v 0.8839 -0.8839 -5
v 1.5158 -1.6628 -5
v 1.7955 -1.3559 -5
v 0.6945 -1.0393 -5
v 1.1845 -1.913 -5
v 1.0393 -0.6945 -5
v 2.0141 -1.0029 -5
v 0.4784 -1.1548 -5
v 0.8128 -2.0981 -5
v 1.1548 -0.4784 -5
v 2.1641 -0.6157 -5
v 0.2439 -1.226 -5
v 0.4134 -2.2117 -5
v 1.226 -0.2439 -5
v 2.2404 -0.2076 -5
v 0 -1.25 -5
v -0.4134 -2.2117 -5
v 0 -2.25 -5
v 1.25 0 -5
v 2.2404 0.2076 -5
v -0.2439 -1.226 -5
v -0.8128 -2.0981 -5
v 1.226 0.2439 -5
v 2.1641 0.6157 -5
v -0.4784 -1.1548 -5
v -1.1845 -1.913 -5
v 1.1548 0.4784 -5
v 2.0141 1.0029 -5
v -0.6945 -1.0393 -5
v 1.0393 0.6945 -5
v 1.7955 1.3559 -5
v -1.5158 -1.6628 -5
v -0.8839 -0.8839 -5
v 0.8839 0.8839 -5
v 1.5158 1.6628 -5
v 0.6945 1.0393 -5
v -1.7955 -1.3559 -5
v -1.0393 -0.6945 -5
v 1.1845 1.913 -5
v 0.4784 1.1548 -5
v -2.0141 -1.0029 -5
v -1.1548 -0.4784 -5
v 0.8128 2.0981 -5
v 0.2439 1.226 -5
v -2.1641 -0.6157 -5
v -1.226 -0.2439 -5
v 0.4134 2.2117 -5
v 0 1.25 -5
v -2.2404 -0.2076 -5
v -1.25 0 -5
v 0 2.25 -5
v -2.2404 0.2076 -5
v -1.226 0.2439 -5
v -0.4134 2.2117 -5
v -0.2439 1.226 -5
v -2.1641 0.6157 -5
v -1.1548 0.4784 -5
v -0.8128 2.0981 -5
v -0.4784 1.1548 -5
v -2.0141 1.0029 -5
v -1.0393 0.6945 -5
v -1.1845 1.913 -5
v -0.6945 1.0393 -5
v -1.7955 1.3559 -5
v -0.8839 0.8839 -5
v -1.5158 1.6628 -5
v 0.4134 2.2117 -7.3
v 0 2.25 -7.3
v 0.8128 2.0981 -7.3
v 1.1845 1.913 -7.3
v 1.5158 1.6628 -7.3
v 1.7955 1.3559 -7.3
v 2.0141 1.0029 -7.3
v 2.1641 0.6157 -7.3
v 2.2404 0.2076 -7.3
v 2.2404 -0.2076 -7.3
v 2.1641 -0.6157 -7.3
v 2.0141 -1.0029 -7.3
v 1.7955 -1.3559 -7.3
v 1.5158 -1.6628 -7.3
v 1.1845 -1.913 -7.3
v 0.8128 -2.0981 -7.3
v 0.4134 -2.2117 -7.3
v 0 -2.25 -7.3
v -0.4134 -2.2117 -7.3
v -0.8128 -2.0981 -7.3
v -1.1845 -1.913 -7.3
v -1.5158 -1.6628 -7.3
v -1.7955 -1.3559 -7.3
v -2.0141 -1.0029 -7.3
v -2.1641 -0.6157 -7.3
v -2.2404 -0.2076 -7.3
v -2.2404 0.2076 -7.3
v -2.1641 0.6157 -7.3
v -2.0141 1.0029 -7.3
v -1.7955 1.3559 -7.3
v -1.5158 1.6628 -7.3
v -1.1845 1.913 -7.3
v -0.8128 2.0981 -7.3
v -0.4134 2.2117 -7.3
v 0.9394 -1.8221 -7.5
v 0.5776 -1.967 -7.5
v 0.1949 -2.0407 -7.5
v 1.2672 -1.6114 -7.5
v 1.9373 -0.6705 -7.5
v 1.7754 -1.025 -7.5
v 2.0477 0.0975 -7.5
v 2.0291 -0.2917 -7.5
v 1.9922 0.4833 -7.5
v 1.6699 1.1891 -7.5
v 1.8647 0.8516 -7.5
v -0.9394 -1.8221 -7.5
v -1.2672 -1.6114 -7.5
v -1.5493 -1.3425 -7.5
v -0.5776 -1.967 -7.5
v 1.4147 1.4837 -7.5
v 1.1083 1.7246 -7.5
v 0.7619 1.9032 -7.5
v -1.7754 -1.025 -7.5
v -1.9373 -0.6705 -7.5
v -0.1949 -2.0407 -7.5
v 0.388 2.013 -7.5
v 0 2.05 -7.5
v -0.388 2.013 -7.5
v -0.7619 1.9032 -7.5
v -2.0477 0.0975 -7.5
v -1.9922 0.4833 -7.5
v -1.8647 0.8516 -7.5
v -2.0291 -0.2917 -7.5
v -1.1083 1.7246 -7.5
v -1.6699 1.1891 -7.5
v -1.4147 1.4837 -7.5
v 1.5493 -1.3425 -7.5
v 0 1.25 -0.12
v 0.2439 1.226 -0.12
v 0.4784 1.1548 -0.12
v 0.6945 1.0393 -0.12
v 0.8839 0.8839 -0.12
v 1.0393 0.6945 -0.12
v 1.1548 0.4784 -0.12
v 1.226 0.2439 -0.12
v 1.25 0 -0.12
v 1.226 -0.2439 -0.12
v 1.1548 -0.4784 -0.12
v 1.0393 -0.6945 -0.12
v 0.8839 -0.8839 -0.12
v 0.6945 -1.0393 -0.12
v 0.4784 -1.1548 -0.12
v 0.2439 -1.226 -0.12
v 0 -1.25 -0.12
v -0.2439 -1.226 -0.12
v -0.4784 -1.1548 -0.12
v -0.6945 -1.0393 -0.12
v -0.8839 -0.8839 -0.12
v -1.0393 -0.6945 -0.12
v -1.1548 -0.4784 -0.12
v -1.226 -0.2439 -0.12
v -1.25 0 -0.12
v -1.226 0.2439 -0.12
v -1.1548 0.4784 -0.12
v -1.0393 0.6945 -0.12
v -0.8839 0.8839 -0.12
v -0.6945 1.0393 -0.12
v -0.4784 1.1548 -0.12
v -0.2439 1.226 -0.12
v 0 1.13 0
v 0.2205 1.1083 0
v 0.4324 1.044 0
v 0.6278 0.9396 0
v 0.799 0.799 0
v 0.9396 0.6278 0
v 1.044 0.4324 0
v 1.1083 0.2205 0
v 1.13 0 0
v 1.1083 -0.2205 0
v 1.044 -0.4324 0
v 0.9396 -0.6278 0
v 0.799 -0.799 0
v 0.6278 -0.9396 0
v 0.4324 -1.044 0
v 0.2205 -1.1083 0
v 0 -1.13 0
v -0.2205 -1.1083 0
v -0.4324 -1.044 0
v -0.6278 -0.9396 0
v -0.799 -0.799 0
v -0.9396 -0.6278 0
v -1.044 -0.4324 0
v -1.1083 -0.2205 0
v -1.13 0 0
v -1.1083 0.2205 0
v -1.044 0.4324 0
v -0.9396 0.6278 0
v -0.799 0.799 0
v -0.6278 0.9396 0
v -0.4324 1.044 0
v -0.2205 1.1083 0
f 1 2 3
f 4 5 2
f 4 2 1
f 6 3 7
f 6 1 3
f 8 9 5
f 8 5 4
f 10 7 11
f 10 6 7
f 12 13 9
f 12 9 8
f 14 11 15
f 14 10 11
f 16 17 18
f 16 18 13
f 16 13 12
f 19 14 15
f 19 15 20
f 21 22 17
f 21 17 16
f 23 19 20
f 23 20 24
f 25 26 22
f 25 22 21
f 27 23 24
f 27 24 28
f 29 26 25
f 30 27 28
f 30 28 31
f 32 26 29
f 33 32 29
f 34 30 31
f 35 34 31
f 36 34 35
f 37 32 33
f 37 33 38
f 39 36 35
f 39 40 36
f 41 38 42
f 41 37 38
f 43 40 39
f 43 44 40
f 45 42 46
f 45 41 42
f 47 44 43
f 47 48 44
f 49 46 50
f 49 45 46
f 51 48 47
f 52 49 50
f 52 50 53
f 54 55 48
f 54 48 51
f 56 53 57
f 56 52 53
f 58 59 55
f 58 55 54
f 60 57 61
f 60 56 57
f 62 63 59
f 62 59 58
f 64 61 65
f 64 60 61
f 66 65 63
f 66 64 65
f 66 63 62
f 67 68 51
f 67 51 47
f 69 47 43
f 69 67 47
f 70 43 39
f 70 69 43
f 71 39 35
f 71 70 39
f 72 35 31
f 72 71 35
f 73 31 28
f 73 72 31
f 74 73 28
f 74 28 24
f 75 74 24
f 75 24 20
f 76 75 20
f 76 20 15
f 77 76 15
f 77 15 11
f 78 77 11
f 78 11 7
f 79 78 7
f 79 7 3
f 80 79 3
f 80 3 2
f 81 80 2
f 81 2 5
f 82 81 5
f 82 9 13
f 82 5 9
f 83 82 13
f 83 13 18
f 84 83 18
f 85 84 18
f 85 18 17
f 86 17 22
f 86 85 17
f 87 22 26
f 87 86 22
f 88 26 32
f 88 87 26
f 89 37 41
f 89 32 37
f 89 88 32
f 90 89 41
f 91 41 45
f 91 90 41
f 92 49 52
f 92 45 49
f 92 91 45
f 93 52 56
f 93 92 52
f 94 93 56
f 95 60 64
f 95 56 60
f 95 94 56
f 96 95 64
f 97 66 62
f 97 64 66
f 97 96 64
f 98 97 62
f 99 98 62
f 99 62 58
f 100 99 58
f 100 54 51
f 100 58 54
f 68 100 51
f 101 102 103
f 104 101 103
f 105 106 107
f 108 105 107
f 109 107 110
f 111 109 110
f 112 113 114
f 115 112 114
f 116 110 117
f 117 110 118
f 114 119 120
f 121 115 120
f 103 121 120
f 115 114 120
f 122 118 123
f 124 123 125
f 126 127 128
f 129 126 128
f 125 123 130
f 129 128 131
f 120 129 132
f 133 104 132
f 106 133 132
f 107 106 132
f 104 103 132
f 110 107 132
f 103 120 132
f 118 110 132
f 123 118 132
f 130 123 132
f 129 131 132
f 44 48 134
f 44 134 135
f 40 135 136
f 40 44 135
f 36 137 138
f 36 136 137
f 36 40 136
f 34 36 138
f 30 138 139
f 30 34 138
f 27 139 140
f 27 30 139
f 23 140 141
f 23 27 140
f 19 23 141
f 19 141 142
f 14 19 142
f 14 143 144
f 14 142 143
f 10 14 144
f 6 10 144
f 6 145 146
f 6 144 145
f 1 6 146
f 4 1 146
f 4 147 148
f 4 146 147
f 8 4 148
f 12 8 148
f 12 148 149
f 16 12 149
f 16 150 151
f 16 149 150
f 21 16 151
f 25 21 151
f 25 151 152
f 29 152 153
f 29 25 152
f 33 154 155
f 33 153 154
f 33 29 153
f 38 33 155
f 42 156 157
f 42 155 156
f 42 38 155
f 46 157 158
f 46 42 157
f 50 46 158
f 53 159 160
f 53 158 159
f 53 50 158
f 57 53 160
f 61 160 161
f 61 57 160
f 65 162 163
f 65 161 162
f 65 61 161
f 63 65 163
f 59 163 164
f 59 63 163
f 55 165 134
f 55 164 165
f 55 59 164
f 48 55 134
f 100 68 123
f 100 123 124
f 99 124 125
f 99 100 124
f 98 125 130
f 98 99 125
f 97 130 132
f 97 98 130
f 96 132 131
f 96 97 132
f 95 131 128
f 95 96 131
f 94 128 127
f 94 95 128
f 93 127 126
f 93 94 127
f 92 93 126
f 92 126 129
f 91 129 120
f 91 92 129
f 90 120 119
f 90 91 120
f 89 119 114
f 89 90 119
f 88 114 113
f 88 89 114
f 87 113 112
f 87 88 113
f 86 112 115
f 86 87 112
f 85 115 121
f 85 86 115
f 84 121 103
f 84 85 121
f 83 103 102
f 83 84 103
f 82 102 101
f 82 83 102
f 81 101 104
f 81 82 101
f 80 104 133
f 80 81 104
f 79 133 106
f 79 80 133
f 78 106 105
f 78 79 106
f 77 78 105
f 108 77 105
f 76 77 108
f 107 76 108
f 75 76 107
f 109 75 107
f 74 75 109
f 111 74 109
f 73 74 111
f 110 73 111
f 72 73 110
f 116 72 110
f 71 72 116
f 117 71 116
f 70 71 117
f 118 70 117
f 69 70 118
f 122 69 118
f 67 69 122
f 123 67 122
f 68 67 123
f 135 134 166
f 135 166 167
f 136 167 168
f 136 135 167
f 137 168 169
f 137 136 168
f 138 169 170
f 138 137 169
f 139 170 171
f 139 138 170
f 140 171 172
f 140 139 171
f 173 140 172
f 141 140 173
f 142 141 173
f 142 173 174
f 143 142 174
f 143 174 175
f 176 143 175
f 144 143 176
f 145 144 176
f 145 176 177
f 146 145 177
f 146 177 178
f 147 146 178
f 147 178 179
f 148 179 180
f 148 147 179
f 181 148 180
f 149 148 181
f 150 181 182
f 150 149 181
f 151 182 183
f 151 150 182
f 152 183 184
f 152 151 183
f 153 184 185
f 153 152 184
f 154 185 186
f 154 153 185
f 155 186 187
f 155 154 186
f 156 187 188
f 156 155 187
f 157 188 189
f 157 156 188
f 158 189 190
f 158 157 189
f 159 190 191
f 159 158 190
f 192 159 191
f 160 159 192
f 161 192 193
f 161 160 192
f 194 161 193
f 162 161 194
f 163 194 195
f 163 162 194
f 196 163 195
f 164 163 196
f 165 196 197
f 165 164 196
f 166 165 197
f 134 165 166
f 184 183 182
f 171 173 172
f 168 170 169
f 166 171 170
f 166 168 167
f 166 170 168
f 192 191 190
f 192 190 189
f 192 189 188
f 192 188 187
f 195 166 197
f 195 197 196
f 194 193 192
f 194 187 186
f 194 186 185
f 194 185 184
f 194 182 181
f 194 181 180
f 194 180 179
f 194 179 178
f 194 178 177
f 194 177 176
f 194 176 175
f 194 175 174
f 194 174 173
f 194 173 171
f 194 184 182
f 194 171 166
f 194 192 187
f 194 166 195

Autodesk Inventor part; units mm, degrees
ref_plane "YZ Plane" through (0, 0, 0) normal (1, 0, 0) x (0, 1, 0)
ref_plane "XZ Plane" through (0, 0, 0) normal (0, 1, 0) x (-1, 0, 0)
ref_plane "XY Plane" through (0, 0, 0) normal (0, 0, 1) x (1, 0, 0)
sketch "スケッチ1" plane through (0, 0, 0) normal (1, 0, 0) x (0, 1, 0)
  line L0 (0, 0) -> (1.25, 0)
  line L1 (1.25, 0) -> (1.25, -5)
  line L2 (1.25, -5) -> (0, -5)
  line L3 (0, -5) -> (0, 0)
  line L4 (0, -5) -> (2.25, -5)
  line L5 (2.25, -5) -> (2.25, -7.5)
  line L6 (2.25, -7.5) -> (0, -7.5)
  line L7 (0, -7.5) -> (0, -5)
  line L8 (2.25, -7.3) -> (2.05, -7.5)
  line L9 (1.25, -0.12) -> (1.13, 0)
  point P0 (2.25, -6.25)
  dimension "d0" = 45
  dimension "d1" = 2.25
  dimension "d2" = 2.5
  dimension "d3" = 5
  dimension "d7" = 1.25
  dimension "d10" = 45
  dimension "d11" = 0.2
  dimension "d12" = 0.12
revolve "回転1" add sketch "スケッチ1" angle 360 about axis through (0, 0, -5) along (0, 0, 1) contours L0 L9 L1 L2 L3 | L2 L4 L5 L8 L6 L7
thread "ねじ2" size "M2.5x0.45" class "6g" standard "ANSI Metric M Profile" length 30
properties part number "M2-5_5mm" material "ステンレス鋼"
